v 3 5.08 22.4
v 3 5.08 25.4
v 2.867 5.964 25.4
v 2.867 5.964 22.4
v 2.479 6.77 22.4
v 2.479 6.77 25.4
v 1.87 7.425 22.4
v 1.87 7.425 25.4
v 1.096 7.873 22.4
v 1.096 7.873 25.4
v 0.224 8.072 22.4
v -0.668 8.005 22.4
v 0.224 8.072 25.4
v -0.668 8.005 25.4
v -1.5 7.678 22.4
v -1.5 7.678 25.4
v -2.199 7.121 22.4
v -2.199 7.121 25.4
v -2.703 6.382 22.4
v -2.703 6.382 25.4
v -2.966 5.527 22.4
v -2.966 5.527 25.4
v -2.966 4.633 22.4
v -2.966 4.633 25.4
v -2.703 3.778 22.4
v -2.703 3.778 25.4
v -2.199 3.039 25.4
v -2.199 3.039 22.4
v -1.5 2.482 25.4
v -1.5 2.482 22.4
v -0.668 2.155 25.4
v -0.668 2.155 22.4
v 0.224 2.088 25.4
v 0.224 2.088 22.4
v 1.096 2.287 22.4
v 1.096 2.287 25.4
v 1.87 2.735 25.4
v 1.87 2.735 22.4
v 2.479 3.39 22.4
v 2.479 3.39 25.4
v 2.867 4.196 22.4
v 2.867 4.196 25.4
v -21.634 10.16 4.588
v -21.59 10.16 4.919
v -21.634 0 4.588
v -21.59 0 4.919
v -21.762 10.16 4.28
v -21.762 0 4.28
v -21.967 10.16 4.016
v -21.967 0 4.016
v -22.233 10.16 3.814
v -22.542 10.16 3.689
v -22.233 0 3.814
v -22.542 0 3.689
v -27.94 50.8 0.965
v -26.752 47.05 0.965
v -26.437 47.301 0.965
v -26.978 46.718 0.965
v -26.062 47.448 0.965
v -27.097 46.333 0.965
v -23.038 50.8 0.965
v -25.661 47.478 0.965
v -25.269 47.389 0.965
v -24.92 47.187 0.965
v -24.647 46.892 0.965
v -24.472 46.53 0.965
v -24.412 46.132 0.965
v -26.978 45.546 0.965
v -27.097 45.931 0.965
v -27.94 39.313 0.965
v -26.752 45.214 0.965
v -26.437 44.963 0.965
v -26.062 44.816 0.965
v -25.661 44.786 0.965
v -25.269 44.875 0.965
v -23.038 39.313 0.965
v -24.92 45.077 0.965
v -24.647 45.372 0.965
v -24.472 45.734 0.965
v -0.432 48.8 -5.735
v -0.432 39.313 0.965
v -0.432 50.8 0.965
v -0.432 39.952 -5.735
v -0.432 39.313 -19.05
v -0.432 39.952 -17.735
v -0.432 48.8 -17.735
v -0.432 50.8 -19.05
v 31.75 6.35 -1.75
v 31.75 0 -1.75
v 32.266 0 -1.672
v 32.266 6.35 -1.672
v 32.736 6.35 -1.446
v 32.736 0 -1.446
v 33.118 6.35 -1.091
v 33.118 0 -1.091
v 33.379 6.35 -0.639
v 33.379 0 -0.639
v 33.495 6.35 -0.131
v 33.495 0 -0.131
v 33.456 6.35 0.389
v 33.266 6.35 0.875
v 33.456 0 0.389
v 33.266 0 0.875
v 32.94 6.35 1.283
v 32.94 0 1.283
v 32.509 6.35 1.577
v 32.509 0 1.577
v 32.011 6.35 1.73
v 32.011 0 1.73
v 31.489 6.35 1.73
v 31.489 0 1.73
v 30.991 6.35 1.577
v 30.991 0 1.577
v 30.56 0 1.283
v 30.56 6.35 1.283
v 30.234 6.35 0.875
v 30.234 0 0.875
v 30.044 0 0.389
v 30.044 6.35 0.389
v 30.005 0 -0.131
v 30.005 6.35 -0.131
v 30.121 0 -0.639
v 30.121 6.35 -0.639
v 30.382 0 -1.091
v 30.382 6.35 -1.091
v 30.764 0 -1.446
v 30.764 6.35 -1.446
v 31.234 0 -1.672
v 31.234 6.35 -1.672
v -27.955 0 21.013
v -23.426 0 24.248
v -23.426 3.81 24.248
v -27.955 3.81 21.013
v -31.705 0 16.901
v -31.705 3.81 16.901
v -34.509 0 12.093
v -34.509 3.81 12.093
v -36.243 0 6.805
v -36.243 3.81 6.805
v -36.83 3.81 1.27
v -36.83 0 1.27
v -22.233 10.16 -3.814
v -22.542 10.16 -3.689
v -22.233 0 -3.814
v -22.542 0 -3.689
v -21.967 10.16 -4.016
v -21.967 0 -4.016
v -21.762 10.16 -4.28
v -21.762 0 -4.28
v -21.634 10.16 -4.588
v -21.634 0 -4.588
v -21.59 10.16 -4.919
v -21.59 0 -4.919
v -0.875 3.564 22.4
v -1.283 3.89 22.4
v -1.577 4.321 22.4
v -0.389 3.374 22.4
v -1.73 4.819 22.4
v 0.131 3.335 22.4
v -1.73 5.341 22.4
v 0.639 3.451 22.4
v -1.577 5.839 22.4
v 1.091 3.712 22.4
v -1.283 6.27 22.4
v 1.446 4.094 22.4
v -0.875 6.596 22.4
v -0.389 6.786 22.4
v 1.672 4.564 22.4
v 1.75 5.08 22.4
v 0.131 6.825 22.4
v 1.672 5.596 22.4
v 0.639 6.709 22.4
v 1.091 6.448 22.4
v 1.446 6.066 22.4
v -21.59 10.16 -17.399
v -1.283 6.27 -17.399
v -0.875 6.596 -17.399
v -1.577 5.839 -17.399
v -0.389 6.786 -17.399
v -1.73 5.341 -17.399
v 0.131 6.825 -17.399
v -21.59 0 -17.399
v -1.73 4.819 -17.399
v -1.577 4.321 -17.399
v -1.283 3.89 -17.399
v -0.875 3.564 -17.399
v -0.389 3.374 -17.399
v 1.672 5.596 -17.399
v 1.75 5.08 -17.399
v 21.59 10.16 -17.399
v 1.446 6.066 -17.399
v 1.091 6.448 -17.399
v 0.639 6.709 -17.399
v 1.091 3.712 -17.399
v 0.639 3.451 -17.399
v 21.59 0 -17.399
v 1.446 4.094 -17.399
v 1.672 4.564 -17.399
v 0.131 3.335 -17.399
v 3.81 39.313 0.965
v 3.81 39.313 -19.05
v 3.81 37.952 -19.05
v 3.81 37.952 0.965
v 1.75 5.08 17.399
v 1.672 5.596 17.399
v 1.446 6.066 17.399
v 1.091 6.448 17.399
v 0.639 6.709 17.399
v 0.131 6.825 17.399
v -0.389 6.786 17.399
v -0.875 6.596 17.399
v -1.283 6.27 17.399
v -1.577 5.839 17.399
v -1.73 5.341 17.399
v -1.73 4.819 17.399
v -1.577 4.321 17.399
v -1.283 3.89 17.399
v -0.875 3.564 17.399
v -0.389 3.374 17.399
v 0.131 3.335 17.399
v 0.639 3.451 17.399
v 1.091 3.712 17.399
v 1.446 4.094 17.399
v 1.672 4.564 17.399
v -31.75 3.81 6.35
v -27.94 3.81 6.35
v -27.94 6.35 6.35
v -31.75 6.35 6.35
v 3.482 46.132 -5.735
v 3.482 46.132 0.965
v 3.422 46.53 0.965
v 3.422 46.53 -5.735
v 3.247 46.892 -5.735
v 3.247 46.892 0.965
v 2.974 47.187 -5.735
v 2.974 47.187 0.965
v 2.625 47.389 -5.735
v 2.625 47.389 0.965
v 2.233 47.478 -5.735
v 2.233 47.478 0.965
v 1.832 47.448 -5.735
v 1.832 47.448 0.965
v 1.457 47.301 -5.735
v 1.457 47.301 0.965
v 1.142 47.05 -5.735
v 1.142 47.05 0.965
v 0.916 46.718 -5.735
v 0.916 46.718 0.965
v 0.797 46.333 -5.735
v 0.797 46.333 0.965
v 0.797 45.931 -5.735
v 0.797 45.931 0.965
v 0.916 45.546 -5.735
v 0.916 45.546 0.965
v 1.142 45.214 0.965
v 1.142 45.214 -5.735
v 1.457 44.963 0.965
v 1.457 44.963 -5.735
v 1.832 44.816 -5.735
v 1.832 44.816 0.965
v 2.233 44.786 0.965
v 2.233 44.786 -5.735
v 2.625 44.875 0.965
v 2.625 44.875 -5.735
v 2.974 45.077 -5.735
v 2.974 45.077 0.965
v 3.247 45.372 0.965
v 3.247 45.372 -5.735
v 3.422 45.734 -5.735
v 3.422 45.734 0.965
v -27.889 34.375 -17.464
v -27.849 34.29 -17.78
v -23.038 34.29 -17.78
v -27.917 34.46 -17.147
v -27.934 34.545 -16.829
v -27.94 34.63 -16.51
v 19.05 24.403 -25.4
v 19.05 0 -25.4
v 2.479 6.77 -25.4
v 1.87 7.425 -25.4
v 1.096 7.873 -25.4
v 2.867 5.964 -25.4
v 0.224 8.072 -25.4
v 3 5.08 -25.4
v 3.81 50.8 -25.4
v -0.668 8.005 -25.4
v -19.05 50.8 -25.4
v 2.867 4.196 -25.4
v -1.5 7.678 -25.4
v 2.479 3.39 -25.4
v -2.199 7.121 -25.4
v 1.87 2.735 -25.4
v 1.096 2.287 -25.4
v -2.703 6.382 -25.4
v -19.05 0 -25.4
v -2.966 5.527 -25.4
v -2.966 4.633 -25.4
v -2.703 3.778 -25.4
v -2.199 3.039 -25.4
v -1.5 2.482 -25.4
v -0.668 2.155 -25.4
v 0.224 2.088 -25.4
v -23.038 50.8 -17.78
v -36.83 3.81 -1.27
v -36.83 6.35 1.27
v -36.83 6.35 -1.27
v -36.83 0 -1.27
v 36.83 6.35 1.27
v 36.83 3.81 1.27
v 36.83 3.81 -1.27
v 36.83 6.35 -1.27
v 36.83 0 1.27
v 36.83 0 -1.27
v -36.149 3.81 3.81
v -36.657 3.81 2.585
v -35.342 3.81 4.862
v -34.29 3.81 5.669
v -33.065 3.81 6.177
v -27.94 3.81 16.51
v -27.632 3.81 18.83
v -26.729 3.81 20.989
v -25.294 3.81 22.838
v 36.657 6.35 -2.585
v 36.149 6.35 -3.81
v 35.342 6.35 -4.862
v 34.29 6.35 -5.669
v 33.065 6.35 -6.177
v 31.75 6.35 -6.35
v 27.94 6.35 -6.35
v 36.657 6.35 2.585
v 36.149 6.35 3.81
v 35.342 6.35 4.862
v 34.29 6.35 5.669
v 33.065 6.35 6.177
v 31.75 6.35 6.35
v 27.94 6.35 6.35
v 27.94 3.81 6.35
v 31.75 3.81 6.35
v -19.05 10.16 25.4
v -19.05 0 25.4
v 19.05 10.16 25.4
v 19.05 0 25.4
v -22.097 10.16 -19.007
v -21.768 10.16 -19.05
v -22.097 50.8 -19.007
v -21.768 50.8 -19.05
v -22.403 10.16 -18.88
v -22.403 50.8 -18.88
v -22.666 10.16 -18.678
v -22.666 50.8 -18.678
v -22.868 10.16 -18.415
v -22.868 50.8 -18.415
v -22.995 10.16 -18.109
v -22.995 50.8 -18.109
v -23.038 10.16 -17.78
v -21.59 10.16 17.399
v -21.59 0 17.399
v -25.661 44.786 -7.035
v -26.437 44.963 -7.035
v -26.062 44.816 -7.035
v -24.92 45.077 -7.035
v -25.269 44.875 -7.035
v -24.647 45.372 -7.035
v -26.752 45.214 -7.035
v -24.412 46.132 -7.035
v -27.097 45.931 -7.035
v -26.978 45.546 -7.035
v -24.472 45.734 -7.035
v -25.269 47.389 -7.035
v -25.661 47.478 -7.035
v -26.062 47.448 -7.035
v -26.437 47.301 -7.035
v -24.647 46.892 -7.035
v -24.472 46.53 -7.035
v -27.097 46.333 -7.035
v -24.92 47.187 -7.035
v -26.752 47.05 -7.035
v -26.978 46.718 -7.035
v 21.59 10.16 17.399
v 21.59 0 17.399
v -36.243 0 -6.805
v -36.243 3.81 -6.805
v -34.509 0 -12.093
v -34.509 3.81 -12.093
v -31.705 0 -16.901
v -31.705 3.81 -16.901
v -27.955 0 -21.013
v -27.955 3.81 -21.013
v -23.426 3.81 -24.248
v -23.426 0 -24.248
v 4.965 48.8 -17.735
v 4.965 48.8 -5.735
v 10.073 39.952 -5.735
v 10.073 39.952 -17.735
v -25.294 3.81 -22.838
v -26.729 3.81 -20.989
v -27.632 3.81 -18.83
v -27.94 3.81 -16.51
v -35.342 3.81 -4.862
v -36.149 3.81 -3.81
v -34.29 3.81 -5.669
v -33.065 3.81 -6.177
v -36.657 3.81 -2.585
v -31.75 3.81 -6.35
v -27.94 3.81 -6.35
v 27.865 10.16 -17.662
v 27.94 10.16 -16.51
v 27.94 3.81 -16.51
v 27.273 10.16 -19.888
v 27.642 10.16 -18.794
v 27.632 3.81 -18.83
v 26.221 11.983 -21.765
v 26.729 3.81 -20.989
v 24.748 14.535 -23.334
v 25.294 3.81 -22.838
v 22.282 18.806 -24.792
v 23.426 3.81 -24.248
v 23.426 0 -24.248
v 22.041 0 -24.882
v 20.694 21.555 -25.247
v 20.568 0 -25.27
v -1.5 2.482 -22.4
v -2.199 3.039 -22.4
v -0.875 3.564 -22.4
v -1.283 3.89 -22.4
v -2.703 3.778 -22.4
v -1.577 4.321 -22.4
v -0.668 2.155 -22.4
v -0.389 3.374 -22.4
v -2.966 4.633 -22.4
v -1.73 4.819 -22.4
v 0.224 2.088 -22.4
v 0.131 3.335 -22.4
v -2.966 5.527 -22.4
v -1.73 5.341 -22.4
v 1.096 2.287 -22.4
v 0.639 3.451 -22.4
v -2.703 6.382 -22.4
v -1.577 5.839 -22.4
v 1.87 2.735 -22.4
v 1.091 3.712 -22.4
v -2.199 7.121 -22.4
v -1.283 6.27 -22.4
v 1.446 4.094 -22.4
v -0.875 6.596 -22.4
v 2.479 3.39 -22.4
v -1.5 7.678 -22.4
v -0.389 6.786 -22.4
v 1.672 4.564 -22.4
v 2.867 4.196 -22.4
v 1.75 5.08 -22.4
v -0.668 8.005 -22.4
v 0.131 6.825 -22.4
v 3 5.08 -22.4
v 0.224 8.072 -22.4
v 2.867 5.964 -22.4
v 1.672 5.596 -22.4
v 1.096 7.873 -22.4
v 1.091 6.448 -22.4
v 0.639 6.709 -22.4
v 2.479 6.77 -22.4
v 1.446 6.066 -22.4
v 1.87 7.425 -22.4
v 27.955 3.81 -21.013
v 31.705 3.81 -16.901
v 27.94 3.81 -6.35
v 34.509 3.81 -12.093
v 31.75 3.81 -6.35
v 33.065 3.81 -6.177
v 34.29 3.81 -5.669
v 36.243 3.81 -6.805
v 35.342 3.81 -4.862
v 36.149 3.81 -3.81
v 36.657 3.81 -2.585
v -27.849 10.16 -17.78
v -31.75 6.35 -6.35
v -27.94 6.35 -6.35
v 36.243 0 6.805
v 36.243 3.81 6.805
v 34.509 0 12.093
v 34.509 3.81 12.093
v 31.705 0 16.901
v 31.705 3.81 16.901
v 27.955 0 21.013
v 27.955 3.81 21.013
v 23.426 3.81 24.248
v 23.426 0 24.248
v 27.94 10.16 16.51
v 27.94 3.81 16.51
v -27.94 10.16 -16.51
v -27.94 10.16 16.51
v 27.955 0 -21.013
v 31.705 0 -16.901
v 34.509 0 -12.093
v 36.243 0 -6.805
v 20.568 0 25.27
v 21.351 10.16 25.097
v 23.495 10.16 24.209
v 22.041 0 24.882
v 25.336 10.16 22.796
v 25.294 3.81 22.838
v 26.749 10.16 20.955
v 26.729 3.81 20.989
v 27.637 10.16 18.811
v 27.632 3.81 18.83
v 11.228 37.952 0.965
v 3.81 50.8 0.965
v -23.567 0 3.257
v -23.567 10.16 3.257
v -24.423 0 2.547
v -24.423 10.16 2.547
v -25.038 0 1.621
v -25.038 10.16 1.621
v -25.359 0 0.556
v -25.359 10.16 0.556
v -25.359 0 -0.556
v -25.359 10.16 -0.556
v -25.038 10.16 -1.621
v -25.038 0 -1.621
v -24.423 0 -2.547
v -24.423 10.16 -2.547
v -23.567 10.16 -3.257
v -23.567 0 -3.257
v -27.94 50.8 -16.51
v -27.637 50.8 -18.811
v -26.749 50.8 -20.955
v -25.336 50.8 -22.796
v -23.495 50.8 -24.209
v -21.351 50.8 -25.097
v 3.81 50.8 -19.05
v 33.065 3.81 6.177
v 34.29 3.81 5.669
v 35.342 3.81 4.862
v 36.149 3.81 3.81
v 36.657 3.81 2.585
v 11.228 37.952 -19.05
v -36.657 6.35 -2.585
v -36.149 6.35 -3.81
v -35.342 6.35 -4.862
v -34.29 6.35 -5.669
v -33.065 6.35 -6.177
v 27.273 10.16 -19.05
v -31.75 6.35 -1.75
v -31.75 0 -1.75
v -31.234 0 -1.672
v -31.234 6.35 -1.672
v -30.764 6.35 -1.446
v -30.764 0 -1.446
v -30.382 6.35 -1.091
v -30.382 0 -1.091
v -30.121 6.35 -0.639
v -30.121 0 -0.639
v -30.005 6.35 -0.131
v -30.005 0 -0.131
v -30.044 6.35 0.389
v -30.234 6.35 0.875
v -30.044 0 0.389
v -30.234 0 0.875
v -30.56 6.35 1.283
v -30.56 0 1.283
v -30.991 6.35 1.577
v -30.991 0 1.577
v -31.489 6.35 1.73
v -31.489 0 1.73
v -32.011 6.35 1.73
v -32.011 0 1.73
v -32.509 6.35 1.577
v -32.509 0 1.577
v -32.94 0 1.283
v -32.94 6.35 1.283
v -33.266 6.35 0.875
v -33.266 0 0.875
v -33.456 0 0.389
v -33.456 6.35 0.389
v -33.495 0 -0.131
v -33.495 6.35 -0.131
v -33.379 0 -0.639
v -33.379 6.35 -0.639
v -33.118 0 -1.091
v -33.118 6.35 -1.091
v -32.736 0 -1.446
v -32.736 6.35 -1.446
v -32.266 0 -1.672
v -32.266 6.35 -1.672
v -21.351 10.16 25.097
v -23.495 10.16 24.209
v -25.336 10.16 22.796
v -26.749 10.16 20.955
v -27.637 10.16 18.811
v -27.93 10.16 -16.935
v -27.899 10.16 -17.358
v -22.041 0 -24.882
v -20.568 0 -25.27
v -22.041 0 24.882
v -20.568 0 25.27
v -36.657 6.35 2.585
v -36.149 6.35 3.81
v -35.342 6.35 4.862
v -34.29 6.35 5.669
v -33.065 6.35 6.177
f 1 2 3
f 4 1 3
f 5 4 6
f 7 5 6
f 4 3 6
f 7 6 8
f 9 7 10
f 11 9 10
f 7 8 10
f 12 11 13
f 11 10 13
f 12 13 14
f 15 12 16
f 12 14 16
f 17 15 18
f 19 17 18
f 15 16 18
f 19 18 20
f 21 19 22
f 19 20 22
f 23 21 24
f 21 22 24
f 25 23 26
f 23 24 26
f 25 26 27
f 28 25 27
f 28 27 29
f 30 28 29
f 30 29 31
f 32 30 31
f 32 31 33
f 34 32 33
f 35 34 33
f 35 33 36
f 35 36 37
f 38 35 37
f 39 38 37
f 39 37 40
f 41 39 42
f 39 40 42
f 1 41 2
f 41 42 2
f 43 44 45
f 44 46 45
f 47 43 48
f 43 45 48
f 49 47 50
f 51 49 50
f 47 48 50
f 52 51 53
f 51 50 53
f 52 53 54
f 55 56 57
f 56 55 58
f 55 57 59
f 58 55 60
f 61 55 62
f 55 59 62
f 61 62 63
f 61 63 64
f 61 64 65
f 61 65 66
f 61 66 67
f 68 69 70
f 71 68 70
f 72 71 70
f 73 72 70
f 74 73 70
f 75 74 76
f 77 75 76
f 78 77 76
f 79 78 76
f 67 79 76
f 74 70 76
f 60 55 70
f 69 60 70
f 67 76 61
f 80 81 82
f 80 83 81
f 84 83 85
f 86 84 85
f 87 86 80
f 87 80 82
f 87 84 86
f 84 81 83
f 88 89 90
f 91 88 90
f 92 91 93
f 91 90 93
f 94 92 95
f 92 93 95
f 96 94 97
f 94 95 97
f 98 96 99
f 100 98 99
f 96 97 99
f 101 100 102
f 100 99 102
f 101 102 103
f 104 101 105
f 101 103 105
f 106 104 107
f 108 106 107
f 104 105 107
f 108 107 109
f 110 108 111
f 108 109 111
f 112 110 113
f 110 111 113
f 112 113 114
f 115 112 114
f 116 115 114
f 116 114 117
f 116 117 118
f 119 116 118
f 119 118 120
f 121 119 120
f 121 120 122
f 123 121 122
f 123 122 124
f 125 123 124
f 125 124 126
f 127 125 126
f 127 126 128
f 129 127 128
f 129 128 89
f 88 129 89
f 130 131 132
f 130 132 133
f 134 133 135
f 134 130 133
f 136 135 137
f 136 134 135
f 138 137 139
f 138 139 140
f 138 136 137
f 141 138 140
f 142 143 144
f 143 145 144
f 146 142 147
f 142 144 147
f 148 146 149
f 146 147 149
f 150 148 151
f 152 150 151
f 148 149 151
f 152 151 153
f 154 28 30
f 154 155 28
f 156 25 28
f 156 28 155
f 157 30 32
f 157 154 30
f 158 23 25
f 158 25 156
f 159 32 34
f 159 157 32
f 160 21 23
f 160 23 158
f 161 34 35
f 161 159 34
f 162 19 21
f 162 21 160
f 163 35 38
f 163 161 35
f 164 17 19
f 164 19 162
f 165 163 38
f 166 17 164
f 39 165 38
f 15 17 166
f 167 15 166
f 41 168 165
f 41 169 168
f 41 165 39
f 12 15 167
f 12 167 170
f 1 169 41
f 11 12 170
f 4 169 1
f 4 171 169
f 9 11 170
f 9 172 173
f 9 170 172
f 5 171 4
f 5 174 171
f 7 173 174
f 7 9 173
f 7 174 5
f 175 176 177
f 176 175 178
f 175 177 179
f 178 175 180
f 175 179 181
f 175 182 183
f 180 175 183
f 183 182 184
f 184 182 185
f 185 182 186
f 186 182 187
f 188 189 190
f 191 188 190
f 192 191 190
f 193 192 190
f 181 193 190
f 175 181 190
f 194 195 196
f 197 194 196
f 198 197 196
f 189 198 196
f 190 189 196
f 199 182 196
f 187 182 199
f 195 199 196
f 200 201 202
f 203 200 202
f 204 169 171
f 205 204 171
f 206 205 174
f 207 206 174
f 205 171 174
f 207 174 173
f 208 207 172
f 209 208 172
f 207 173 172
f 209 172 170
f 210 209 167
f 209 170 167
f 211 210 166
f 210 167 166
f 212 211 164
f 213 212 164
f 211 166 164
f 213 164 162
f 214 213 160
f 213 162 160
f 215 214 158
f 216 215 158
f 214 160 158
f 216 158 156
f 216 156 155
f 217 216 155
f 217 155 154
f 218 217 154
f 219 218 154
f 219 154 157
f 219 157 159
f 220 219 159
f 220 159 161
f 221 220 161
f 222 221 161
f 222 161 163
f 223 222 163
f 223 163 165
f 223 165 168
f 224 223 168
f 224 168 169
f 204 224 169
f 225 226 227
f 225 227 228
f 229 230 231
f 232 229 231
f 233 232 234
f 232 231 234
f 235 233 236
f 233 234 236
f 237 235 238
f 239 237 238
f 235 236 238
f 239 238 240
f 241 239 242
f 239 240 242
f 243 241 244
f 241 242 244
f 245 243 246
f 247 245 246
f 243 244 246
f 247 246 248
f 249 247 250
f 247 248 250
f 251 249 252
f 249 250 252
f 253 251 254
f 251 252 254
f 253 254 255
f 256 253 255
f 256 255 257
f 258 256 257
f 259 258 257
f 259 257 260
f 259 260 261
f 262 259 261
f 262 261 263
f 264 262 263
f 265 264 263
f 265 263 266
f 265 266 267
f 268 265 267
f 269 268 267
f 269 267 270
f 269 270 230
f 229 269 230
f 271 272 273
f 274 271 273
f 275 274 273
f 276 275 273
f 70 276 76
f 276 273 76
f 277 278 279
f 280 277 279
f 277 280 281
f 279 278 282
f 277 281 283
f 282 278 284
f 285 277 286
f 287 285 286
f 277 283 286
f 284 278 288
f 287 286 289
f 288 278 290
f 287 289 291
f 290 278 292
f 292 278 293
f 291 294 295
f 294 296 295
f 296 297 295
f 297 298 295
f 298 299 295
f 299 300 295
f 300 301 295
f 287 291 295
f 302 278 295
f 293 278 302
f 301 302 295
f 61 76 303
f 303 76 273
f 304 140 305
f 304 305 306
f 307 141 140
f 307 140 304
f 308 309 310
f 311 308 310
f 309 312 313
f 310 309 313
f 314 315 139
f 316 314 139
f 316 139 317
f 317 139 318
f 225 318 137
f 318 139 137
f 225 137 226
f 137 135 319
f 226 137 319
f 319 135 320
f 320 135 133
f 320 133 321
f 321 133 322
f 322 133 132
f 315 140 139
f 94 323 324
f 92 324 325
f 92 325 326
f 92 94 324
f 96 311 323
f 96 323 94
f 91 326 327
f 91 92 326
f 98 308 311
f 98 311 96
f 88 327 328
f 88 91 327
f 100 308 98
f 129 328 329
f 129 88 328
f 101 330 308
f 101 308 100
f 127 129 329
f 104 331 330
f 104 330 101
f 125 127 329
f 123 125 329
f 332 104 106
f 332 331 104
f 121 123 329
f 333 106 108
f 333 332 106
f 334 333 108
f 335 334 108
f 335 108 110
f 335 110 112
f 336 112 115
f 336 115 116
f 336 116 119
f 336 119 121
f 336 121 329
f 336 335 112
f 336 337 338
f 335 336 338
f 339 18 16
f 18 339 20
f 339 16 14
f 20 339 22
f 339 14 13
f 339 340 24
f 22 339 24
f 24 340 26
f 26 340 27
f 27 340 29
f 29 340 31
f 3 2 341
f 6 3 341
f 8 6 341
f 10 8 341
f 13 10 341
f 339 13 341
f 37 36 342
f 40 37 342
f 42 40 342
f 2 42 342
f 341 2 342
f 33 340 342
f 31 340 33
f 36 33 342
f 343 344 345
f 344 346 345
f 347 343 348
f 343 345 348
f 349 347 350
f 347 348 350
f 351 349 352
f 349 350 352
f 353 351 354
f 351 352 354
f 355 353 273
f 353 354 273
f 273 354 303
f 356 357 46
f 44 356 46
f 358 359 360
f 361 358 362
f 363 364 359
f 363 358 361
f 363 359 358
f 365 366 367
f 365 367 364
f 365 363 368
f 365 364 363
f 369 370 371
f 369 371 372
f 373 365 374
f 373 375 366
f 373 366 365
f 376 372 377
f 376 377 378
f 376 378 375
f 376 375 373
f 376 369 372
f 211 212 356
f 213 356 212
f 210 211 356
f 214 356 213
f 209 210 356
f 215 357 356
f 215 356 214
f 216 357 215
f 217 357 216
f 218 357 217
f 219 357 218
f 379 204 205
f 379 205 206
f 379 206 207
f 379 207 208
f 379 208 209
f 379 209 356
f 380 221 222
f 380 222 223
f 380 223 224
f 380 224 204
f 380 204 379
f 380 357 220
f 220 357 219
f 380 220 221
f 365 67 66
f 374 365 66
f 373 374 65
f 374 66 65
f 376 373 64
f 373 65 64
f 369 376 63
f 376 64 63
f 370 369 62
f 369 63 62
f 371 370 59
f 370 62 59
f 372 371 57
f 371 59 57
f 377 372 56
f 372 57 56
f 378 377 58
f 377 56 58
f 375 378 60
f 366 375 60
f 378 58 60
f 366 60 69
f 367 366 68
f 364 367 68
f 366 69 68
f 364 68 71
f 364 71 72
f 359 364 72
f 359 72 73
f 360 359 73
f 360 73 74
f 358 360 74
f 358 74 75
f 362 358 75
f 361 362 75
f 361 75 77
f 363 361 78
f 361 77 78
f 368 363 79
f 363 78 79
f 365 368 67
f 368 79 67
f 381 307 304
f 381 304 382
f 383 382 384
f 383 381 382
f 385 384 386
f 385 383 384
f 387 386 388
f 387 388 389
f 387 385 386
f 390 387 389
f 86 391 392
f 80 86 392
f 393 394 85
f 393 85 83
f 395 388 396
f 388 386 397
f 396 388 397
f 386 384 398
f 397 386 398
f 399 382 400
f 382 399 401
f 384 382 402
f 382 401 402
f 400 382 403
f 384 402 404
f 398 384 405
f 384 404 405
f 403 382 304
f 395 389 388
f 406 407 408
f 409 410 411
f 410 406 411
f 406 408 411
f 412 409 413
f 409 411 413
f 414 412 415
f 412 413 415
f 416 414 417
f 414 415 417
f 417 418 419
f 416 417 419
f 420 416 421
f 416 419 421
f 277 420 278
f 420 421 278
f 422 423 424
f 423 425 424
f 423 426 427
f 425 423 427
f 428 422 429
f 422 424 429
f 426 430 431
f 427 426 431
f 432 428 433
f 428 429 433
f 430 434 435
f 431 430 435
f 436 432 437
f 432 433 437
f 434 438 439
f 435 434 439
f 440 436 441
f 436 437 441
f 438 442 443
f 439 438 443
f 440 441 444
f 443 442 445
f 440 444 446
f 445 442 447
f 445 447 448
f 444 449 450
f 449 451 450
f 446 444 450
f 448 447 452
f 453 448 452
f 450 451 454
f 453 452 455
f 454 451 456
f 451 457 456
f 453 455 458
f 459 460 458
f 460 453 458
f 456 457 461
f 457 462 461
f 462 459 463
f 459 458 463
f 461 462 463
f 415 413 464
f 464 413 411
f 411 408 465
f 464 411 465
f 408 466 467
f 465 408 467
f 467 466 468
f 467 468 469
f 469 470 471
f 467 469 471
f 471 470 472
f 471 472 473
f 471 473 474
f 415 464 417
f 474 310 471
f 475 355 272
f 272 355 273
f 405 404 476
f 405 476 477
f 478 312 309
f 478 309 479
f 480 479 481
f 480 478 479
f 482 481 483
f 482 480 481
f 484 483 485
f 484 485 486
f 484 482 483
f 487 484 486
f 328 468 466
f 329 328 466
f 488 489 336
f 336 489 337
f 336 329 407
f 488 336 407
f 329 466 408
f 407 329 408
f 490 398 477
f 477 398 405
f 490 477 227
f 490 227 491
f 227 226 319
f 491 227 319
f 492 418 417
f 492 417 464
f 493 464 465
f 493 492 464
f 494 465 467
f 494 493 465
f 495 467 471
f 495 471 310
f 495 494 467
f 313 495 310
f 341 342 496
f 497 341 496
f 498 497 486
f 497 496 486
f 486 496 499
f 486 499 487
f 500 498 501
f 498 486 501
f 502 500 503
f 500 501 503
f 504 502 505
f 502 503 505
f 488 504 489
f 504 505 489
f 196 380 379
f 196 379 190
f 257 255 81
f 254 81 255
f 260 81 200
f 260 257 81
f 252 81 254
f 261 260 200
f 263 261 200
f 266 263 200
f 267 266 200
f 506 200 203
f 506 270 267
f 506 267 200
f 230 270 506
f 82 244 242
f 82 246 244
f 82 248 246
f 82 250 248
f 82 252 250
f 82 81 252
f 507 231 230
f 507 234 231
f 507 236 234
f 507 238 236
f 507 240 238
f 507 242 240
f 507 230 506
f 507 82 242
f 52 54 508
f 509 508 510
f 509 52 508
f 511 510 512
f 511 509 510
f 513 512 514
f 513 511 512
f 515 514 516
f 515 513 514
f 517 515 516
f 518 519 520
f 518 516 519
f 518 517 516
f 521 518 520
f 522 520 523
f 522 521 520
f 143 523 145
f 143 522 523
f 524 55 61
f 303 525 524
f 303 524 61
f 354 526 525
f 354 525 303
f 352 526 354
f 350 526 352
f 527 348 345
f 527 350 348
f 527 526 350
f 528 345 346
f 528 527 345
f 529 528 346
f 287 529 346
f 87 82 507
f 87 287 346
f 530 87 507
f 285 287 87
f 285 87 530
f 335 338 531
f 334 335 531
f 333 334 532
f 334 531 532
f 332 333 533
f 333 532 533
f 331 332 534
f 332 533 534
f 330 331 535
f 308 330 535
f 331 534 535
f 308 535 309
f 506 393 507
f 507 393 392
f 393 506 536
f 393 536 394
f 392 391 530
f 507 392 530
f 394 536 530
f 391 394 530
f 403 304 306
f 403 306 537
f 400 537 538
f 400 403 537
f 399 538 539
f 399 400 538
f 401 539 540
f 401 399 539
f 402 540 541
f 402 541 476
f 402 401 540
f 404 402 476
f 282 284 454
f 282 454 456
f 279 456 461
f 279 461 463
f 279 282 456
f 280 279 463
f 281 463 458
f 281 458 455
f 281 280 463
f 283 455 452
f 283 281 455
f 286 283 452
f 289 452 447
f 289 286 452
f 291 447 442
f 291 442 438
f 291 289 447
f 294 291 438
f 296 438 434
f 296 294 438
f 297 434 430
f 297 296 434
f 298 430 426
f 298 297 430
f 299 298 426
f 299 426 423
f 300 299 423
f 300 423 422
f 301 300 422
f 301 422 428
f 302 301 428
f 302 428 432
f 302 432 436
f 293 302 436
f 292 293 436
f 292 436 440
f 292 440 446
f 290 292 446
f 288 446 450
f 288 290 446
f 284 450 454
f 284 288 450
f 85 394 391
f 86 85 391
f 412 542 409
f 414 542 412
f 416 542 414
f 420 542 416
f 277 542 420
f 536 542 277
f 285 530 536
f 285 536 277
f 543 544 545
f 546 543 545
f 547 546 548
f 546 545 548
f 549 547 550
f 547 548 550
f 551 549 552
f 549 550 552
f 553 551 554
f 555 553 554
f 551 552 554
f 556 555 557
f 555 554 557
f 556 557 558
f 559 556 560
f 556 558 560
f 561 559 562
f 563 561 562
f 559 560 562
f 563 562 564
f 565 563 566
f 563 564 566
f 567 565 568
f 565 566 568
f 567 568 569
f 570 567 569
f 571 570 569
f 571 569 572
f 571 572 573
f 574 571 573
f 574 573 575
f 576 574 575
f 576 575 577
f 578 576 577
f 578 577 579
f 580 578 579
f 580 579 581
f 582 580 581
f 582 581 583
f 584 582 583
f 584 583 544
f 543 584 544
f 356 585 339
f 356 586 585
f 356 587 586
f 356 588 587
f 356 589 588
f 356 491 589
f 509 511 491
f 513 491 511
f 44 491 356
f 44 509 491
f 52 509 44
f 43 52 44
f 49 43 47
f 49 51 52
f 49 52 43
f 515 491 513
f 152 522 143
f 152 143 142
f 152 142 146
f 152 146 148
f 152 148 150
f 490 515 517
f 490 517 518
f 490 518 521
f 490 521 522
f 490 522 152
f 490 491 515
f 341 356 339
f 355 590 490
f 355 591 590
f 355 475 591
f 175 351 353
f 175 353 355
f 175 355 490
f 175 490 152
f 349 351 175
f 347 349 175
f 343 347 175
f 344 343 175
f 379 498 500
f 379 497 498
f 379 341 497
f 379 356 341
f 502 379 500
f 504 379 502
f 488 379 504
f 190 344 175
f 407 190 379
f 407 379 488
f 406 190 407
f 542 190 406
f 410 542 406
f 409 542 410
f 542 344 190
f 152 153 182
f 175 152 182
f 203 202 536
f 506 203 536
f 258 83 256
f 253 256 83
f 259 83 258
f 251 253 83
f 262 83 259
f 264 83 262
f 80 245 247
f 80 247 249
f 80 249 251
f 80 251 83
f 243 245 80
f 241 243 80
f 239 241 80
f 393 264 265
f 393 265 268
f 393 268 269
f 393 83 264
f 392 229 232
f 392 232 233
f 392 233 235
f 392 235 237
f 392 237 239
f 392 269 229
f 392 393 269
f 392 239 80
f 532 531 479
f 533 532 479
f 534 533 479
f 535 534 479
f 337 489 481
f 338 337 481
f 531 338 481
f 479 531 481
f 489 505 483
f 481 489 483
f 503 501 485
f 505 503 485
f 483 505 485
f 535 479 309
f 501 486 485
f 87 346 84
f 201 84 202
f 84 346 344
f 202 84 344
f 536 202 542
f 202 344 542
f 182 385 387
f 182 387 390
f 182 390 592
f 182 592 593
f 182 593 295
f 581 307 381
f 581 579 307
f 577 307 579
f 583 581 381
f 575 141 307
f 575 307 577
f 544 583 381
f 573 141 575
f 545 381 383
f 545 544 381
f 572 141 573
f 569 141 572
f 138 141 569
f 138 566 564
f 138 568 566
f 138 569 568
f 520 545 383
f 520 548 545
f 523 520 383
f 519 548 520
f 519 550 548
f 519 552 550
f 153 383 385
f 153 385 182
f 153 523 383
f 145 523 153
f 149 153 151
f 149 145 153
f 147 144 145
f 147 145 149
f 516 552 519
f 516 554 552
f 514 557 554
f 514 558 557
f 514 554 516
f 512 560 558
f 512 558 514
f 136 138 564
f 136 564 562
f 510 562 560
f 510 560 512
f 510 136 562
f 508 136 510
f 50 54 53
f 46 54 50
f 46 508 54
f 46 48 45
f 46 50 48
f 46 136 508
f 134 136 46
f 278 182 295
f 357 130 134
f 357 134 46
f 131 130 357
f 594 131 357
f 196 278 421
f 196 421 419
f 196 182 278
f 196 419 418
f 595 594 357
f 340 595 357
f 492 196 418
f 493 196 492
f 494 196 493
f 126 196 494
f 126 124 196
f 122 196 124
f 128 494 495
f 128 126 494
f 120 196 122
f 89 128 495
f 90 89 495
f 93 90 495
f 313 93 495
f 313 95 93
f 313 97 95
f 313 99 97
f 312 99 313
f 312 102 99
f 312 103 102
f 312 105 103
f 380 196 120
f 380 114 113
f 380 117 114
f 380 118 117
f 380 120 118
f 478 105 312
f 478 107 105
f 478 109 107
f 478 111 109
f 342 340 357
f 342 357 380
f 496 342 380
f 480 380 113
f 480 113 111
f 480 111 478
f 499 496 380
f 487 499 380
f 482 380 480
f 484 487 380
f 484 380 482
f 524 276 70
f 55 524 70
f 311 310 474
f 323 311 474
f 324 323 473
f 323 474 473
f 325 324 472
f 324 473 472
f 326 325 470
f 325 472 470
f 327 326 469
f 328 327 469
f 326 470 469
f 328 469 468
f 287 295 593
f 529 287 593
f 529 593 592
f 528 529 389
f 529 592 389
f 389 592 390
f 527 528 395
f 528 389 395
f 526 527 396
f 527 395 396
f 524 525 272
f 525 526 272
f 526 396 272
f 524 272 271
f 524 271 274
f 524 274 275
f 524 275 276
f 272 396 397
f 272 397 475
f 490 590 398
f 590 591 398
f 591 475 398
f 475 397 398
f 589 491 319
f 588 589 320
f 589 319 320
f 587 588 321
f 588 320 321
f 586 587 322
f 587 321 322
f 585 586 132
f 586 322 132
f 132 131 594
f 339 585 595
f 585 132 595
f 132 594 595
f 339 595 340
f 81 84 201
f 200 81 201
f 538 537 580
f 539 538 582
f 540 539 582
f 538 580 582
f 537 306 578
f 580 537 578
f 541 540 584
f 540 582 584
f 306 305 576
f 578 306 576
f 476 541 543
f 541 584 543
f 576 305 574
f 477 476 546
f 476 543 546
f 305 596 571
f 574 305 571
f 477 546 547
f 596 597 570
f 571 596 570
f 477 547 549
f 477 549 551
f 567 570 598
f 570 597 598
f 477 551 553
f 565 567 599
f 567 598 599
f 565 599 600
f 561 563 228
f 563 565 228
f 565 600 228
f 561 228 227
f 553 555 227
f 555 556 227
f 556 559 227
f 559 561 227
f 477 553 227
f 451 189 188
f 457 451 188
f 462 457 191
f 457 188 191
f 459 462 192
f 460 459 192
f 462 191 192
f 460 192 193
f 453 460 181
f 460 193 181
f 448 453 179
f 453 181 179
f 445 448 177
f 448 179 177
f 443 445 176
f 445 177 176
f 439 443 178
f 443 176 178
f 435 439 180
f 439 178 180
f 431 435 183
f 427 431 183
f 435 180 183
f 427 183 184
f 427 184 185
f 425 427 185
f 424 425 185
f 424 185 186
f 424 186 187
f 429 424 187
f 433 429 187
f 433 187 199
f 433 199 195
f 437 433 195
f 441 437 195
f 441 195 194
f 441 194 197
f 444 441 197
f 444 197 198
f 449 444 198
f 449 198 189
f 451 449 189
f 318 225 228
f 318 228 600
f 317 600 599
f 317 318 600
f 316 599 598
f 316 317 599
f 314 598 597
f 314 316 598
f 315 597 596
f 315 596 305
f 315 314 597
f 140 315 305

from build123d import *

# Parameters (mm, degrees)
SKETCH1_W           = 55.88
SKETCH1_H           = 50.8
SKETCH1_W_2         = 43.18
SKETCH1_H_2         = 34.798
BOSS_EXTRUDE1_DEPTH = 10.16
SKETCH2_R           = 1.75
CUT_EXTRUDE1_DEPTH  = 59.860081549
SKETCH3_R           = 3
CUT_EXTRUDE2_DEPTH  = 3
SKETCH4_W           = 4.9022
SKETCH4_H           = 20.0152
BOSS_EXTRUDE2_DEPTH = 40.64
CUT_EXTRUDE3_DEPTH  = 77.318648395
FILLET1_R           = 8.89
CHAMFER2_SIZE2      = 40.64
CHAMFER2_SIZE       = 23.46351494
SKETCH6_W           = 4.2418
SKETCH6_H           = 11.487238798
BOSS_EXTRUDE3_DEPTH = 20.0152
BOSS_EXTRUDE5_DEPTH = 20.0152
SKETCH9_R           = 1.35
CUT_EXTRUDE4_DEPTH  = 8
FILLET2_R           = 1.27
BOSS_EXTRUDE6_DEPTH = 6.35
SKETCH11_R          = 1.75
CUT_EXTRUDE5_DEPTH  = 25.4
BOSS_EXTRUDE7_DEPTH = 3.81
CUT_EXTRUDE6_REACH  = 76.62
SKETCH13_W          = 12
SKETCH13_H          = 8.848420696
CUT_EXTRUDE9_REACH  = 62.442
FILLET3_R           = 1.27


# Some blends are built 0.0001 mm under size
with BuildPart() as part:
    # Sketch1 → Boss-Extrude1 (new body)
    with BuildSketch(Plane(origin=(0, 0, 0), x_dir=(1, 0, 0), z_dir=(0, 1, 0))):
        Rectangle(SKETCH1_W, SKETCH1_H)
        Rectangle(SKETCH1_W_2, SKETCH1_H_2, mode=Mode.SUBTRACT)
    extrude(amount=BOSS_EXTRUDE1_DEPTH)

    # Sketch2 → Cut-Extrude1 (cut, through all)
    with BuildSketch(Plane.XY.offset(25.4)):
        with Locations((0, 5.08)):
            Circle(SKETCH2_R)
    extrude(amount=-CUT_EXTRUDE1_DEPTH, mode=Mode.SUBTRACT)

    # Sketch3 → Cut-Extrude2 (cut)
    with BuildSketch(Plane.XY.offset(25.4)):
        with Locations((0, 5.08)):
            Circle(SKETCH3_R)
    cut_extrude2 = extrude(amount=-CUT_EXTRUDE2_DEPTH, mode=Mode.SUBTRACT)

    # Sketch4 → Boss-Extrude2 (add)
    with BuildSketch(Plane(origin=(0, 10.16, 0), x_dir=(1, 0, 0), z_dir=(0, 1, 0))):
        with Locations((-25.4889, 9.0424)):
            Rectangle(SKETCH4_W, SKETCH4_H)
        Polygon((3.81, 25.4), (-27.94, 25.4), (-27.94, 19.05), (-23.0378, 19.05), (3.81, 19.05), align=None)
    extrude(amount=BOSS_EXTRUDE2_DEPTH)

    # Sketch5 → Cut-Extrude3 (cut, through all)
    with BuildSketch(Plane(origin=(-23.0378, 0, 0), x_dir=(0, 0, -1), z_dir=(1, 0, 0))):
        Polygon((17.78, 34.29), (-0.9652, 39.312761202), (-0.9652, 10.16), (17.78, 10.16), align=None)
    extrude(amount=-CUT_EXTRUDE3_DEPTH, mode=Mode.SUBTRACT)

    # Fillet1
    # the kernel refuses this fillet: 8.89 mm, written as the material it takes off along each edge
    with BuildSketch(Plane(origin=(-27.94, -22.225, 25.4), x_dir=(1, 0, 0), z_dir=(0, 1, 0)), Plane(origin=(27.94, -22.225, -25.4), x_dir=(-1, 0, 0), z_dir=(0, 1, 0))) as fillet1_piece_1:
        with BuildLine():
            CenterArc((FILLET1_R, FILLET1_R), FILLET1_R, 180, 90)
            Line((0, FILLET1_R), (0, 0))
            Line((0, 0), (FILLET1_R, 0))
        make_face()
    extrude(amount=54.61, mode=Mode.SUBTRACT)
    with BuildSketch(Plane(origin=(-27.94, -22.225, -25.4), x_dir=(1, 0, 0), z_dir=(0, 1, 0))) as fillet1_piece_2:
        with BuildLine():
            CenterArc((FILLET1_R, -FILLET1_R), FILLET1_R, 90, 90)
            Line((0, -FILLET1_R), (0, 0))
            Line((0, 0), (FILLET1_R, 0))
        make_face()
    extrude(amount=95.25, mode=Mode.SUBTRACT)
    with BuildSketch(Plane(origin=(27.94, -22.225, 25.4), x_dir=(-1, 0, 0), z_dir=(0, 1, 0))) as fillet1_piece_3:
        with BuildLine():
            CenterArc((FILLET1_R, -FILLET1_R), FILLET1_R, 90, 90)
            Line((0, -FILLET1_R), (0, 0))
            Line((0, 0), (FILLET1_R, 0))
        make_face()
    extrude(amount=54.61, mode=Mode.SUBTRACT)

    # Chamfer2
    chamfer2_edges = [part.edges().sort_by_distance(p)[0] for p in [
        (3.81, 10.16, -22.225),
    ]]
    chamfer2_side = [part.faces().sort_by_distance(p)[0] for p in [
        (4.279270299, 10.16, -22.225),
    ]]
    chamfer(chamfer2_edges, length=CHAMFER2_SIZE - 0.0001, length2=CHAMFER2_SIZE2 - 0.0001, reference=chamfer2_side[0])  # a hair under: the kernel refuses the full size

    # Sketch6 → Boss-Extrude3 (add)
    with BuildSketch(Plane.XY.offset(-19.05)):
        with Locations((1.6891, 45.056380601)):
            Rectangle(SKETCH6_W, SKETCH6_H)
    extrude(amount=BOSS_EXTRUDE3_DEPTH)

    # Sketch8 → Boss-Extrude5 (add)
    with BuildSketch(Plane.XY.offset(-19.05)):
        Polygon((3.81, 50.8), (3.81, 37.951579304), (11.228039147, 37.951579304), align=None)
    extrude(amount=BOSS_EXTRUDE5_DEPTH)

    # Sketch9 → Cut-Extrude4 (cut)
    with BuildSketch(Plane.XY.offset(0.9652)):
        with Locations((2.13195, 46.132)):
            Circle(SKETCH9_R)
        with Locations((-25.76195, 46.132)):
            Circle(SKETCH9_R)
    extrude(amount=-CUT_EXTRUDE4_DEPTH, mode=Mode.SUBTRACT)

    # Fillet2
    fillet2_edges = [part.edges().sort_by_distance(p)[0] for p in [
        (-23.0378, 30.48, -19.05),
    ]]
    fillet(fillet2_edges, radius=FILLET2_R)

    # Mirror1: Cut-Extrude2 across plane
    add(cut_extrude2.mirror(Plane.XY), mode=Mode.SUBTRACT)

    # Sketch10 → Boss-Extrude6 (add)
    with BuildSketch(Plane.XZ):
        with BuildLine():
            Line((-27.94, 0), (-27.94, 6.35))
            Line((-27.94, 6.35), (-31.75, 6.35))
            ThreePointArc((-31.75, 6.35), (-35.342102448, 4.862102448), (-36.83, 1.27))
            Line((-36.83, 1.27), (-36.83, -1.27))
            ThreePointArc((-36.83, -1.27), (-35.342102448, -4.862102448), (-31.75, -6.35))
            Line((-31.75, -6.35), (-27.94, -6.35))
            Line((-27.94, -6.35), (-27.94, 0))
        make_face()
    boss_extrude6 = extrude(amount=-BOSS_EXTRUDE6_DEPTH)

    # Mirror2: Boss-Extrude6 across plane
    add(boss_extrude6.mirror(Plane(origin=(0, 0, 0), x_dir=(0, 0, 1), z_dir=(1, 0, 0))))

    # Sketch11 → Cut-Extrude5 (cut)
    with BuildSketch(Plane.XZ):
        with Locations(Location((-31.75, 0, 0), (0, 0, 270))):
            Circle(SKETCH11_R)
        with Locations(Location((31.75, 0, 0), (0, 0, 270))):
            Circle(SKETCH11_R)
    extrude(amount=-CUT_EXTRUDE5_DEPTH, mode=Mode.SUBTRACT)

    # Sketch12 → Boss-Extrude7 (add)
    with BuildSketch(Plane.XZ):
        with BuildLine():
            ThreePointArc((-27.94, 16.51), (-26.728994429, 20.989413417), (-23.425906736, 24.248445596))
            ThreePointArc((-23.425906736, 24.248445596), (-33.234054886, 14.57111535), (-36.83, 1.27))
            ThreePointArc((-36.83, 1.27), (-35.342102448, 4.862102448), (-31.75, 6.35))
            Line((-31.75, 6.35), (-27.94, 6.35))
            Line((-27.94, 6.35), (-27.94, 16.51))
        make_face()
        with BuildLine():
            ThreePointArc((-31.75, -6.35), (-35.342102448, -4.862102448), (-36.83, -1.27))
            ThreePointArc((-36.83, -1.27), (-33.234054886, -14.57111535), (-23.425906736, -24.248445596))
            ThreePointArc((-23.425906736, -24.248445596), (-26.728994429, -20.989413417), (-27.94, -16.51))
            Line((-27.94, -16.51), (-27.94, -6.35))
            Line((-27.94, -6.35), (-31.75, -6.35))
        make_face()
        with BuildLine():
            ThreePointArc((23.425906736, -24.248445596), (33.234054886, -14.57111535), (36.83, -1.27))
            ThreePointArc((36.83, -1.27), (35.342102448, -4.862102448), (31.75, -6.35))
            Line((31.75, -6.35), (27.94, -6.35))
            Line((27.94, -6.35), (27.94, -16.51))
            ThreePointArc((27.94, -16.51), (26.728994429, -20.989413417), (23.425906736, -24.248445596))
        make_face()
        with BuildLine():
            ThreePointArc((36.83, 1.27), (33.234054886, 14.57111535), (23.425906736, 24.248445596))
            ThreePointArc((23.425906736, 24.248445596), (26.728994429, 20.989413417), (27.94, 16.51))
            Line((27.94, 16.51), (27.94, 6.35))
            Line((27.94, 6.35), (31.75, 6.35))
            ThreePointArc((31.75, 6.35), (35.342102448, 4.862102448), (36.83, 1.27))
        make_face()
    extrude(amount=-BOSS_EXTRUDE7_DEPTH)

    # Sketch13 → Cut-Extrude6 (cut, up to next)
    with BuildSketch(Plane.ZY.offset(-11.5682), mode=Mode.PRIVATE) as cut_extrude6_sk1:
        with Locations((-11.7348, 44.375789652)):
            Rectangle(SKETCH13_W, SKETCH13_H)
    cut_extrude6_tool1 = extrude(cut_extrude6_sk1.sketch, amount=CUT_EXTRUDE6_REACH, mode=Mode.PRIVATE) & part.part
    add(cut_extrude6_tool1.solids().sort_by_distance((11.5682, 44.37579, -11.7348))[0], mode=Mode.SUBTRACT)

    # Sketch15 → Cut-Extrude9 (cut, up to next)
    with BuildSketch(Plane(origin=(0, 10.16, 0), x_dir=(1, 0, 0), z_dir=(0, 1, 0)), mode=Mode.PRIVATE) as cut_extrude9_sk1:
        with BuildLine():
            Line((-21.59, 3.81), (-21.59, -3.81))
            ThreePointArc((-21.59, -3.81), (-25.4, 0), (-21.59, 3.81))
        make_face()
    cut_extrude9_tool1 = extrude(cut_extrude9_sk1.sketch, amount=-CUT_EXTRUDE9_REACH, mode=Mode.PRIVATE) & part.part
    add(cut_extrude9_tool1.solids().sort_by_distance((-23.207014, 10.16, 0))[0], mode=Mode.SUBTRACT)

    # Fillet3
    fillet3_edges = [part.edges().sort_by_distance(p)[0] for p in [
        (-21.59, 5.08, 3.81),
        (-21.59, 5.08, -3.81),
    ]]
    fillet(fillet3_edges, radius=FILLET3_R)


solid = part.part
